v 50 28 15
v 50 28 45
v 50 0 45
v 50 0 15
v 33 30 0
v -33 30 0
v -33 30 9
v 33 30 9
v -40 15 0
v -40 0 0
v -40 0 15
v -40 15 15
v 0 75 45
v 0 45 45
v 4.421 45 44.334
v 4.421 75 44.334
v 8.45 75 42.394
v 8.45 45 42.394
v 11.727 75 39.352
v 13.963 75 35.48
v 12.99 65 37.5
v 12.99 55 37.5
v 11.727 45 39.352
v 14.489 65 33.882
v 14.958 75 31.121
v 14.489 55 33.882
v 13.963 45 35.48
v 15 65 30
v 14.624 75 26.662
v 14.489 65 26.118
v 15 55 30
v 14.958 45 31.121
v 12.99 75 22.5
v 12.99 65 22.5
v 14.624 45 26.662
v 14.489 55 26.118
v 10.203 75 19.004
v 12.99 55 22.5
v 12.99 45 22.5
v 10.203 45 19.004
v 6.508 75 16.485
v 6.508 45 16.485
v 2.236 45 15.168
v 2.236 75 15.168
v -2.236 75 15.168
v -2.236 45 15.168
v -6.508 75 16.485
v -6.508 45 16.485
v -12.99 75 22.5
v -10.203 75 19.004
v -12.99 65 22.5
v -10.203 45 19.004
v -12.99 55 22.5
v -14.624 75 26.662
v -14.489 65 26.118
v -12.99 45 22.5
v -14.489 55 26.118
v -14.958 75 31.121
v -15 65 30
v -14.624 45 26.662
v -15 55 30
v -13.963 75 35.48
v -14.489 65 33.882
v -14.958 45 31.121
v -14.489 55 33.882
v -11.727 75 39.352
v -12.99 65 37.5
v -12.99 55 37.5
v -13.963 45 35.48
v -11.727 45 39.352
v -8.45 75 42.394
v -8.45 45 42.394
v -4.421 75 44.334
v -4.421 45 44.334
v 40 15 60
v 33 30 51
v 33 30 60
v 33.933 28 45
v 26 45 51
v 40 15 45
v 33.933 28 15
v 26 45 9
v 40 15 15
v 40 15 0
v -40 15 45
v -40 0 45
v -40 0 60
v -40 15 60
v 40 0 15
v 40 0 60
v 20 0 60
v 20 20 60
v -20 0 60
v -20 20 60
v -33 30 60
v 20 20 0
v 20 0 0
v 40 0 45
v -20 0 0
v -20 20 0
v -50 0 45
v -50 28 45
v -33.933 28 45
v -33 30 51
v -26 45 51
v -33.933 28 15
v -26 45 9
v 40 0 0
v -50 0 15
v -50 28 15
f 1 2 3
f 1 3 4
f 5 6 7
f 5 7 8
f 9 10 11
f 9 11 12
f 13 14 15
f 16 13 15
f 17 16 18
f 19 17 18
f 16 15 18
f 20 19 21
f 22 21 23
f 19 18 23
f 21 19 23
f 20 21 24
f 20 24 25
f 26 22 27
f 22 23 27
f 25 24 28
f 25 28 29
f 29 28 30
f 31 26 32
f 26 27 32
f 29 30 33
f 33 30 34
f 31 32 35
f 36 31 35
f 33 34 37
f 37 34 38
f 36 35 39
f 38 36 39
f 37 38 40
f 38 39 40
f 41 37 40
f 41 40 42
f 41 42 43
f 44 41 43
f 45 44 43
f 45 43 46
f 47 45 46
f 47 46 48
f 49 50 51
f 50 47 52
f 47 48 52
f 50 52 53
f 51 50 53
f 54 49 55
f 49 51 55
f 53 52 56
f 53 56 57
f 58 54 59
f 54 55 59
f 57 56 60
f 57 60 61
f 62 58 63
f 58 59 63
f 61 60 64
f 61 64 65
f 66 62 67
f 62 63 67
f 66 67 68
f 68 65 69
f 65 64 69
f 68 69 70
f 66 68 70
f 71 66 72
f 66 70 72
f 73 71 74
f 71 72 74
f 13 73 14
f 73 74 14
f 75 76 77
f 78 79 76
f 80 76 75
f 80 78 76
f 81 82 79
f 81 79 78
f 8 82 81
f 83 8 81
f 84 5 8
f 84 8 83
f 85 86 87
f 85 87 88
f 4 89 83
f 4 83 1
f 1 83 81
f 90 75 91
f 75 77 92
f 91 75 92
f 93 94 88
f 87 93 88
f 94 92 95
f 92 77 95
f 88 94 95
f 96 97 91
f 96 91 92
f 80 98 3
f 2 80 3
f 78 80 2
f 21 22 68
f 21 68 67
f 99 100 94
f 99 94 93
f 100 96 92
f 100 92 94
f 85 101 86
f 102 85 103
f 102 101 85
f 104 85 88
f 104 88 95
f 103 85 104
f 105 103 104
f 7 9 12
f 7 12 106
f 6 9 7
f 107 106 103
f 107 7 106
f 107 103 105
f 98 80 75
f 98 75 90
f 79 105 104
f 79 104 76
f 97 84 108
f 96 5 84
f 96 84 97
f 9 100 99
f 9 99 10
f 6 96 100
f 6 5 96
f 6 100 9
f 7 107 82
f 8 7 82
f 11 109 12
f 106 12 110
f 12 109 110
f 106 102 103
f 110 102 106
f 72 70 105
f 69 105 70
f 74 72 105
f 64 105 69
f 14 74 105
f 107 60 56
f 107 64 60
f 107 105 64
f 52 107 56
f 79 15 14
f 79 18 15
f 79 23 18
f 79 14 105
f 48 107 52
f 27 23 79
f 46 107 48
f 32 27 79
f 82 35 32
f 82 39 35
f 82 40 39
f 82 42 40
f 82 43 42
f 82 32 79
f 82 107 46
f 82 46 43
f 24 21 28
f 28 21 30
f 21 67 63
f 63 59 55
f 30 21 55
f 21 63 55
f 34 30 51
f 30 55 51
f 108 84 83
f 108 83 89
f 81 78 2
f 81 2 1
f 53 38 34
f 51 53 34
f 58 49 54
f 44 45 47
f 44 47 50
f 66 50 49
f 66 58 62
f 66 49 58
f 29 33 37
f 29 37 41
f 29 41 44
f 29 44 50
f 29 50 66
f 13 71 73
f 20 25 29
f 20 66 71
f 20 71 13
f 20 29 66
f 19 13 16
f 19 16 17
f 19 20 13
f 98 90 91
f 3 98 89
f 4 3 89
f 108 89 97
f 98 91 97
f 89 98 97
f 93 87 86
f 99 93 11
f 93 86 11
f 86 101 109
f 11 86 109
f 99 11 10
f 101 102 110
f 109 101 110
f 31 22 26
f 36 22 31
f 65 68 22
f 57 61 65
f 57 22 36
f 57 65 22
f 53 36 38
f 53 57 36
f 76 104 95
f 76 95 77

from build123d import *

# Parameters (mm, degrees)
BOSS_EXTRUDE1_DEPTH      = 60
SKETCH7_W                = 80
SKETCH7_H                = 9
CUT_EXTRUDE4_DEPTH       = 15
SKETCH8_R                = 15
BOSS_EXTRUDE2_DEPTH      = 30
BOSS_EXTRUDE3_DEPTH      = 90
BOSS_EXTRUDE3_DEPTH_BACK = 10
SKETCH10_W               = 30
SKETCH10_H               = 28
SKETCH12_W               = 40
SKETCH12_H               = 20
CUT_EXTRUDE5_DEPTH       = 90
CUT_EXTRUDE6_DEPTH       = 109.282039139
CUT_EXTRUDE6_DEPTH_BACK  = 109.282039139
SKETCH13_W               = 15
SKETCH13_H               = 10


with BuildPart() as part:
    # Sketch1 → Boss-Extrude1 (new body)
    with BuildSketch(Plane.XY):
        Polygon((40, 0), (20, 0), (20, 20), (-20, 20), (-20, 0), (-40, 0), (-40, 15), (-26, 45), (26, 45), (40, 15), align=None)
    extrude(amount=BOSS_EXTRUDE1_DEPTH)

    # Sketch7 → Cut-Extrude4 (cut)
    with BuildSketch(Plane(origin=(0, 45, 0), x_dir=(1, 0, 0), z_dir=(0, 1, 0))):
        with Locations((0, -4.5)):
            Rectangle(SKETCH7_W, SKETCH7_H)
        with Locations((0, -55.5)):
            Rectangle(SKETCH7_W, SKETCH7_H)
    extrude(amount=-CUT_EXTRUDE4_DEPTH, mode=Mode.SUBTRACT)

    # Sketch8 → Boss-Extrude2 (add)
    with BuildSketch(Plane(origin=(0, 45, 0), x_dir=(1, 0, 0), z_dir=(0, 1, 0))):
        with Locations(Location((0, -30, 0), (0, 0, 270))):
            Circle(SKETCH8_R)
    extrude(amount=BOSS_EXTRUDE2_DEPTH)

    # Sketch10 → Boss-Extrude3 (add, two sides: drawn at the far end of the back side and taken through both)
    with BuildSketch(Plane(origin=(-40, 0, 0), x_dir=(0, 0, -1), z_dir=(1, 0, 0)).offset(-BOSS_EXTRUDE3_DEPTH_BACK)):
        with Locations((-30, 14)):
            Rectangle(SKETCH10_W, SKETCH10_H)
    extrude(amount=BOSS_EXTRUDE3_DEPTH + BOSS_EXTRUDE3_DEPTH_BACK)

    # Sketch12 → Cut-Extrude5 (cut)
    with BuildSketch(Plane(origin=(0, 0, 15), x_dir=(-1, 0, 0), z_dir=(0, 0, -1))):
        with Locations((0, 10)):
            Rectangle(SKETCH12_W, SKETCH12_H)
    extrude(amount=-CUT_EXTRUDE5_DEPTH, mode=Mode.SUBTRACT)

    # Sketch13 → Cut-Extrude6 (cut, two sides: drawn at the far end of the back side and taken through both)
    with BuildSketch(Plane(origin=(0, 0, 0), x_dir=(0, 0, -1), z_dir=(1, 0, 0)).offset(-CUT_EXTRUDE6_DEPTH_BACK)):
        with Locations((-30, 60)):
            Rectangle(SKETCH13_W, SKETCH13_H)
    extrude(amount=CUT_EXTRUDE6_DEPTH + CUT_EXTRUDE6_DEPTH_BACK, mode=Mode.SUBTRACT)


solid = part.part
